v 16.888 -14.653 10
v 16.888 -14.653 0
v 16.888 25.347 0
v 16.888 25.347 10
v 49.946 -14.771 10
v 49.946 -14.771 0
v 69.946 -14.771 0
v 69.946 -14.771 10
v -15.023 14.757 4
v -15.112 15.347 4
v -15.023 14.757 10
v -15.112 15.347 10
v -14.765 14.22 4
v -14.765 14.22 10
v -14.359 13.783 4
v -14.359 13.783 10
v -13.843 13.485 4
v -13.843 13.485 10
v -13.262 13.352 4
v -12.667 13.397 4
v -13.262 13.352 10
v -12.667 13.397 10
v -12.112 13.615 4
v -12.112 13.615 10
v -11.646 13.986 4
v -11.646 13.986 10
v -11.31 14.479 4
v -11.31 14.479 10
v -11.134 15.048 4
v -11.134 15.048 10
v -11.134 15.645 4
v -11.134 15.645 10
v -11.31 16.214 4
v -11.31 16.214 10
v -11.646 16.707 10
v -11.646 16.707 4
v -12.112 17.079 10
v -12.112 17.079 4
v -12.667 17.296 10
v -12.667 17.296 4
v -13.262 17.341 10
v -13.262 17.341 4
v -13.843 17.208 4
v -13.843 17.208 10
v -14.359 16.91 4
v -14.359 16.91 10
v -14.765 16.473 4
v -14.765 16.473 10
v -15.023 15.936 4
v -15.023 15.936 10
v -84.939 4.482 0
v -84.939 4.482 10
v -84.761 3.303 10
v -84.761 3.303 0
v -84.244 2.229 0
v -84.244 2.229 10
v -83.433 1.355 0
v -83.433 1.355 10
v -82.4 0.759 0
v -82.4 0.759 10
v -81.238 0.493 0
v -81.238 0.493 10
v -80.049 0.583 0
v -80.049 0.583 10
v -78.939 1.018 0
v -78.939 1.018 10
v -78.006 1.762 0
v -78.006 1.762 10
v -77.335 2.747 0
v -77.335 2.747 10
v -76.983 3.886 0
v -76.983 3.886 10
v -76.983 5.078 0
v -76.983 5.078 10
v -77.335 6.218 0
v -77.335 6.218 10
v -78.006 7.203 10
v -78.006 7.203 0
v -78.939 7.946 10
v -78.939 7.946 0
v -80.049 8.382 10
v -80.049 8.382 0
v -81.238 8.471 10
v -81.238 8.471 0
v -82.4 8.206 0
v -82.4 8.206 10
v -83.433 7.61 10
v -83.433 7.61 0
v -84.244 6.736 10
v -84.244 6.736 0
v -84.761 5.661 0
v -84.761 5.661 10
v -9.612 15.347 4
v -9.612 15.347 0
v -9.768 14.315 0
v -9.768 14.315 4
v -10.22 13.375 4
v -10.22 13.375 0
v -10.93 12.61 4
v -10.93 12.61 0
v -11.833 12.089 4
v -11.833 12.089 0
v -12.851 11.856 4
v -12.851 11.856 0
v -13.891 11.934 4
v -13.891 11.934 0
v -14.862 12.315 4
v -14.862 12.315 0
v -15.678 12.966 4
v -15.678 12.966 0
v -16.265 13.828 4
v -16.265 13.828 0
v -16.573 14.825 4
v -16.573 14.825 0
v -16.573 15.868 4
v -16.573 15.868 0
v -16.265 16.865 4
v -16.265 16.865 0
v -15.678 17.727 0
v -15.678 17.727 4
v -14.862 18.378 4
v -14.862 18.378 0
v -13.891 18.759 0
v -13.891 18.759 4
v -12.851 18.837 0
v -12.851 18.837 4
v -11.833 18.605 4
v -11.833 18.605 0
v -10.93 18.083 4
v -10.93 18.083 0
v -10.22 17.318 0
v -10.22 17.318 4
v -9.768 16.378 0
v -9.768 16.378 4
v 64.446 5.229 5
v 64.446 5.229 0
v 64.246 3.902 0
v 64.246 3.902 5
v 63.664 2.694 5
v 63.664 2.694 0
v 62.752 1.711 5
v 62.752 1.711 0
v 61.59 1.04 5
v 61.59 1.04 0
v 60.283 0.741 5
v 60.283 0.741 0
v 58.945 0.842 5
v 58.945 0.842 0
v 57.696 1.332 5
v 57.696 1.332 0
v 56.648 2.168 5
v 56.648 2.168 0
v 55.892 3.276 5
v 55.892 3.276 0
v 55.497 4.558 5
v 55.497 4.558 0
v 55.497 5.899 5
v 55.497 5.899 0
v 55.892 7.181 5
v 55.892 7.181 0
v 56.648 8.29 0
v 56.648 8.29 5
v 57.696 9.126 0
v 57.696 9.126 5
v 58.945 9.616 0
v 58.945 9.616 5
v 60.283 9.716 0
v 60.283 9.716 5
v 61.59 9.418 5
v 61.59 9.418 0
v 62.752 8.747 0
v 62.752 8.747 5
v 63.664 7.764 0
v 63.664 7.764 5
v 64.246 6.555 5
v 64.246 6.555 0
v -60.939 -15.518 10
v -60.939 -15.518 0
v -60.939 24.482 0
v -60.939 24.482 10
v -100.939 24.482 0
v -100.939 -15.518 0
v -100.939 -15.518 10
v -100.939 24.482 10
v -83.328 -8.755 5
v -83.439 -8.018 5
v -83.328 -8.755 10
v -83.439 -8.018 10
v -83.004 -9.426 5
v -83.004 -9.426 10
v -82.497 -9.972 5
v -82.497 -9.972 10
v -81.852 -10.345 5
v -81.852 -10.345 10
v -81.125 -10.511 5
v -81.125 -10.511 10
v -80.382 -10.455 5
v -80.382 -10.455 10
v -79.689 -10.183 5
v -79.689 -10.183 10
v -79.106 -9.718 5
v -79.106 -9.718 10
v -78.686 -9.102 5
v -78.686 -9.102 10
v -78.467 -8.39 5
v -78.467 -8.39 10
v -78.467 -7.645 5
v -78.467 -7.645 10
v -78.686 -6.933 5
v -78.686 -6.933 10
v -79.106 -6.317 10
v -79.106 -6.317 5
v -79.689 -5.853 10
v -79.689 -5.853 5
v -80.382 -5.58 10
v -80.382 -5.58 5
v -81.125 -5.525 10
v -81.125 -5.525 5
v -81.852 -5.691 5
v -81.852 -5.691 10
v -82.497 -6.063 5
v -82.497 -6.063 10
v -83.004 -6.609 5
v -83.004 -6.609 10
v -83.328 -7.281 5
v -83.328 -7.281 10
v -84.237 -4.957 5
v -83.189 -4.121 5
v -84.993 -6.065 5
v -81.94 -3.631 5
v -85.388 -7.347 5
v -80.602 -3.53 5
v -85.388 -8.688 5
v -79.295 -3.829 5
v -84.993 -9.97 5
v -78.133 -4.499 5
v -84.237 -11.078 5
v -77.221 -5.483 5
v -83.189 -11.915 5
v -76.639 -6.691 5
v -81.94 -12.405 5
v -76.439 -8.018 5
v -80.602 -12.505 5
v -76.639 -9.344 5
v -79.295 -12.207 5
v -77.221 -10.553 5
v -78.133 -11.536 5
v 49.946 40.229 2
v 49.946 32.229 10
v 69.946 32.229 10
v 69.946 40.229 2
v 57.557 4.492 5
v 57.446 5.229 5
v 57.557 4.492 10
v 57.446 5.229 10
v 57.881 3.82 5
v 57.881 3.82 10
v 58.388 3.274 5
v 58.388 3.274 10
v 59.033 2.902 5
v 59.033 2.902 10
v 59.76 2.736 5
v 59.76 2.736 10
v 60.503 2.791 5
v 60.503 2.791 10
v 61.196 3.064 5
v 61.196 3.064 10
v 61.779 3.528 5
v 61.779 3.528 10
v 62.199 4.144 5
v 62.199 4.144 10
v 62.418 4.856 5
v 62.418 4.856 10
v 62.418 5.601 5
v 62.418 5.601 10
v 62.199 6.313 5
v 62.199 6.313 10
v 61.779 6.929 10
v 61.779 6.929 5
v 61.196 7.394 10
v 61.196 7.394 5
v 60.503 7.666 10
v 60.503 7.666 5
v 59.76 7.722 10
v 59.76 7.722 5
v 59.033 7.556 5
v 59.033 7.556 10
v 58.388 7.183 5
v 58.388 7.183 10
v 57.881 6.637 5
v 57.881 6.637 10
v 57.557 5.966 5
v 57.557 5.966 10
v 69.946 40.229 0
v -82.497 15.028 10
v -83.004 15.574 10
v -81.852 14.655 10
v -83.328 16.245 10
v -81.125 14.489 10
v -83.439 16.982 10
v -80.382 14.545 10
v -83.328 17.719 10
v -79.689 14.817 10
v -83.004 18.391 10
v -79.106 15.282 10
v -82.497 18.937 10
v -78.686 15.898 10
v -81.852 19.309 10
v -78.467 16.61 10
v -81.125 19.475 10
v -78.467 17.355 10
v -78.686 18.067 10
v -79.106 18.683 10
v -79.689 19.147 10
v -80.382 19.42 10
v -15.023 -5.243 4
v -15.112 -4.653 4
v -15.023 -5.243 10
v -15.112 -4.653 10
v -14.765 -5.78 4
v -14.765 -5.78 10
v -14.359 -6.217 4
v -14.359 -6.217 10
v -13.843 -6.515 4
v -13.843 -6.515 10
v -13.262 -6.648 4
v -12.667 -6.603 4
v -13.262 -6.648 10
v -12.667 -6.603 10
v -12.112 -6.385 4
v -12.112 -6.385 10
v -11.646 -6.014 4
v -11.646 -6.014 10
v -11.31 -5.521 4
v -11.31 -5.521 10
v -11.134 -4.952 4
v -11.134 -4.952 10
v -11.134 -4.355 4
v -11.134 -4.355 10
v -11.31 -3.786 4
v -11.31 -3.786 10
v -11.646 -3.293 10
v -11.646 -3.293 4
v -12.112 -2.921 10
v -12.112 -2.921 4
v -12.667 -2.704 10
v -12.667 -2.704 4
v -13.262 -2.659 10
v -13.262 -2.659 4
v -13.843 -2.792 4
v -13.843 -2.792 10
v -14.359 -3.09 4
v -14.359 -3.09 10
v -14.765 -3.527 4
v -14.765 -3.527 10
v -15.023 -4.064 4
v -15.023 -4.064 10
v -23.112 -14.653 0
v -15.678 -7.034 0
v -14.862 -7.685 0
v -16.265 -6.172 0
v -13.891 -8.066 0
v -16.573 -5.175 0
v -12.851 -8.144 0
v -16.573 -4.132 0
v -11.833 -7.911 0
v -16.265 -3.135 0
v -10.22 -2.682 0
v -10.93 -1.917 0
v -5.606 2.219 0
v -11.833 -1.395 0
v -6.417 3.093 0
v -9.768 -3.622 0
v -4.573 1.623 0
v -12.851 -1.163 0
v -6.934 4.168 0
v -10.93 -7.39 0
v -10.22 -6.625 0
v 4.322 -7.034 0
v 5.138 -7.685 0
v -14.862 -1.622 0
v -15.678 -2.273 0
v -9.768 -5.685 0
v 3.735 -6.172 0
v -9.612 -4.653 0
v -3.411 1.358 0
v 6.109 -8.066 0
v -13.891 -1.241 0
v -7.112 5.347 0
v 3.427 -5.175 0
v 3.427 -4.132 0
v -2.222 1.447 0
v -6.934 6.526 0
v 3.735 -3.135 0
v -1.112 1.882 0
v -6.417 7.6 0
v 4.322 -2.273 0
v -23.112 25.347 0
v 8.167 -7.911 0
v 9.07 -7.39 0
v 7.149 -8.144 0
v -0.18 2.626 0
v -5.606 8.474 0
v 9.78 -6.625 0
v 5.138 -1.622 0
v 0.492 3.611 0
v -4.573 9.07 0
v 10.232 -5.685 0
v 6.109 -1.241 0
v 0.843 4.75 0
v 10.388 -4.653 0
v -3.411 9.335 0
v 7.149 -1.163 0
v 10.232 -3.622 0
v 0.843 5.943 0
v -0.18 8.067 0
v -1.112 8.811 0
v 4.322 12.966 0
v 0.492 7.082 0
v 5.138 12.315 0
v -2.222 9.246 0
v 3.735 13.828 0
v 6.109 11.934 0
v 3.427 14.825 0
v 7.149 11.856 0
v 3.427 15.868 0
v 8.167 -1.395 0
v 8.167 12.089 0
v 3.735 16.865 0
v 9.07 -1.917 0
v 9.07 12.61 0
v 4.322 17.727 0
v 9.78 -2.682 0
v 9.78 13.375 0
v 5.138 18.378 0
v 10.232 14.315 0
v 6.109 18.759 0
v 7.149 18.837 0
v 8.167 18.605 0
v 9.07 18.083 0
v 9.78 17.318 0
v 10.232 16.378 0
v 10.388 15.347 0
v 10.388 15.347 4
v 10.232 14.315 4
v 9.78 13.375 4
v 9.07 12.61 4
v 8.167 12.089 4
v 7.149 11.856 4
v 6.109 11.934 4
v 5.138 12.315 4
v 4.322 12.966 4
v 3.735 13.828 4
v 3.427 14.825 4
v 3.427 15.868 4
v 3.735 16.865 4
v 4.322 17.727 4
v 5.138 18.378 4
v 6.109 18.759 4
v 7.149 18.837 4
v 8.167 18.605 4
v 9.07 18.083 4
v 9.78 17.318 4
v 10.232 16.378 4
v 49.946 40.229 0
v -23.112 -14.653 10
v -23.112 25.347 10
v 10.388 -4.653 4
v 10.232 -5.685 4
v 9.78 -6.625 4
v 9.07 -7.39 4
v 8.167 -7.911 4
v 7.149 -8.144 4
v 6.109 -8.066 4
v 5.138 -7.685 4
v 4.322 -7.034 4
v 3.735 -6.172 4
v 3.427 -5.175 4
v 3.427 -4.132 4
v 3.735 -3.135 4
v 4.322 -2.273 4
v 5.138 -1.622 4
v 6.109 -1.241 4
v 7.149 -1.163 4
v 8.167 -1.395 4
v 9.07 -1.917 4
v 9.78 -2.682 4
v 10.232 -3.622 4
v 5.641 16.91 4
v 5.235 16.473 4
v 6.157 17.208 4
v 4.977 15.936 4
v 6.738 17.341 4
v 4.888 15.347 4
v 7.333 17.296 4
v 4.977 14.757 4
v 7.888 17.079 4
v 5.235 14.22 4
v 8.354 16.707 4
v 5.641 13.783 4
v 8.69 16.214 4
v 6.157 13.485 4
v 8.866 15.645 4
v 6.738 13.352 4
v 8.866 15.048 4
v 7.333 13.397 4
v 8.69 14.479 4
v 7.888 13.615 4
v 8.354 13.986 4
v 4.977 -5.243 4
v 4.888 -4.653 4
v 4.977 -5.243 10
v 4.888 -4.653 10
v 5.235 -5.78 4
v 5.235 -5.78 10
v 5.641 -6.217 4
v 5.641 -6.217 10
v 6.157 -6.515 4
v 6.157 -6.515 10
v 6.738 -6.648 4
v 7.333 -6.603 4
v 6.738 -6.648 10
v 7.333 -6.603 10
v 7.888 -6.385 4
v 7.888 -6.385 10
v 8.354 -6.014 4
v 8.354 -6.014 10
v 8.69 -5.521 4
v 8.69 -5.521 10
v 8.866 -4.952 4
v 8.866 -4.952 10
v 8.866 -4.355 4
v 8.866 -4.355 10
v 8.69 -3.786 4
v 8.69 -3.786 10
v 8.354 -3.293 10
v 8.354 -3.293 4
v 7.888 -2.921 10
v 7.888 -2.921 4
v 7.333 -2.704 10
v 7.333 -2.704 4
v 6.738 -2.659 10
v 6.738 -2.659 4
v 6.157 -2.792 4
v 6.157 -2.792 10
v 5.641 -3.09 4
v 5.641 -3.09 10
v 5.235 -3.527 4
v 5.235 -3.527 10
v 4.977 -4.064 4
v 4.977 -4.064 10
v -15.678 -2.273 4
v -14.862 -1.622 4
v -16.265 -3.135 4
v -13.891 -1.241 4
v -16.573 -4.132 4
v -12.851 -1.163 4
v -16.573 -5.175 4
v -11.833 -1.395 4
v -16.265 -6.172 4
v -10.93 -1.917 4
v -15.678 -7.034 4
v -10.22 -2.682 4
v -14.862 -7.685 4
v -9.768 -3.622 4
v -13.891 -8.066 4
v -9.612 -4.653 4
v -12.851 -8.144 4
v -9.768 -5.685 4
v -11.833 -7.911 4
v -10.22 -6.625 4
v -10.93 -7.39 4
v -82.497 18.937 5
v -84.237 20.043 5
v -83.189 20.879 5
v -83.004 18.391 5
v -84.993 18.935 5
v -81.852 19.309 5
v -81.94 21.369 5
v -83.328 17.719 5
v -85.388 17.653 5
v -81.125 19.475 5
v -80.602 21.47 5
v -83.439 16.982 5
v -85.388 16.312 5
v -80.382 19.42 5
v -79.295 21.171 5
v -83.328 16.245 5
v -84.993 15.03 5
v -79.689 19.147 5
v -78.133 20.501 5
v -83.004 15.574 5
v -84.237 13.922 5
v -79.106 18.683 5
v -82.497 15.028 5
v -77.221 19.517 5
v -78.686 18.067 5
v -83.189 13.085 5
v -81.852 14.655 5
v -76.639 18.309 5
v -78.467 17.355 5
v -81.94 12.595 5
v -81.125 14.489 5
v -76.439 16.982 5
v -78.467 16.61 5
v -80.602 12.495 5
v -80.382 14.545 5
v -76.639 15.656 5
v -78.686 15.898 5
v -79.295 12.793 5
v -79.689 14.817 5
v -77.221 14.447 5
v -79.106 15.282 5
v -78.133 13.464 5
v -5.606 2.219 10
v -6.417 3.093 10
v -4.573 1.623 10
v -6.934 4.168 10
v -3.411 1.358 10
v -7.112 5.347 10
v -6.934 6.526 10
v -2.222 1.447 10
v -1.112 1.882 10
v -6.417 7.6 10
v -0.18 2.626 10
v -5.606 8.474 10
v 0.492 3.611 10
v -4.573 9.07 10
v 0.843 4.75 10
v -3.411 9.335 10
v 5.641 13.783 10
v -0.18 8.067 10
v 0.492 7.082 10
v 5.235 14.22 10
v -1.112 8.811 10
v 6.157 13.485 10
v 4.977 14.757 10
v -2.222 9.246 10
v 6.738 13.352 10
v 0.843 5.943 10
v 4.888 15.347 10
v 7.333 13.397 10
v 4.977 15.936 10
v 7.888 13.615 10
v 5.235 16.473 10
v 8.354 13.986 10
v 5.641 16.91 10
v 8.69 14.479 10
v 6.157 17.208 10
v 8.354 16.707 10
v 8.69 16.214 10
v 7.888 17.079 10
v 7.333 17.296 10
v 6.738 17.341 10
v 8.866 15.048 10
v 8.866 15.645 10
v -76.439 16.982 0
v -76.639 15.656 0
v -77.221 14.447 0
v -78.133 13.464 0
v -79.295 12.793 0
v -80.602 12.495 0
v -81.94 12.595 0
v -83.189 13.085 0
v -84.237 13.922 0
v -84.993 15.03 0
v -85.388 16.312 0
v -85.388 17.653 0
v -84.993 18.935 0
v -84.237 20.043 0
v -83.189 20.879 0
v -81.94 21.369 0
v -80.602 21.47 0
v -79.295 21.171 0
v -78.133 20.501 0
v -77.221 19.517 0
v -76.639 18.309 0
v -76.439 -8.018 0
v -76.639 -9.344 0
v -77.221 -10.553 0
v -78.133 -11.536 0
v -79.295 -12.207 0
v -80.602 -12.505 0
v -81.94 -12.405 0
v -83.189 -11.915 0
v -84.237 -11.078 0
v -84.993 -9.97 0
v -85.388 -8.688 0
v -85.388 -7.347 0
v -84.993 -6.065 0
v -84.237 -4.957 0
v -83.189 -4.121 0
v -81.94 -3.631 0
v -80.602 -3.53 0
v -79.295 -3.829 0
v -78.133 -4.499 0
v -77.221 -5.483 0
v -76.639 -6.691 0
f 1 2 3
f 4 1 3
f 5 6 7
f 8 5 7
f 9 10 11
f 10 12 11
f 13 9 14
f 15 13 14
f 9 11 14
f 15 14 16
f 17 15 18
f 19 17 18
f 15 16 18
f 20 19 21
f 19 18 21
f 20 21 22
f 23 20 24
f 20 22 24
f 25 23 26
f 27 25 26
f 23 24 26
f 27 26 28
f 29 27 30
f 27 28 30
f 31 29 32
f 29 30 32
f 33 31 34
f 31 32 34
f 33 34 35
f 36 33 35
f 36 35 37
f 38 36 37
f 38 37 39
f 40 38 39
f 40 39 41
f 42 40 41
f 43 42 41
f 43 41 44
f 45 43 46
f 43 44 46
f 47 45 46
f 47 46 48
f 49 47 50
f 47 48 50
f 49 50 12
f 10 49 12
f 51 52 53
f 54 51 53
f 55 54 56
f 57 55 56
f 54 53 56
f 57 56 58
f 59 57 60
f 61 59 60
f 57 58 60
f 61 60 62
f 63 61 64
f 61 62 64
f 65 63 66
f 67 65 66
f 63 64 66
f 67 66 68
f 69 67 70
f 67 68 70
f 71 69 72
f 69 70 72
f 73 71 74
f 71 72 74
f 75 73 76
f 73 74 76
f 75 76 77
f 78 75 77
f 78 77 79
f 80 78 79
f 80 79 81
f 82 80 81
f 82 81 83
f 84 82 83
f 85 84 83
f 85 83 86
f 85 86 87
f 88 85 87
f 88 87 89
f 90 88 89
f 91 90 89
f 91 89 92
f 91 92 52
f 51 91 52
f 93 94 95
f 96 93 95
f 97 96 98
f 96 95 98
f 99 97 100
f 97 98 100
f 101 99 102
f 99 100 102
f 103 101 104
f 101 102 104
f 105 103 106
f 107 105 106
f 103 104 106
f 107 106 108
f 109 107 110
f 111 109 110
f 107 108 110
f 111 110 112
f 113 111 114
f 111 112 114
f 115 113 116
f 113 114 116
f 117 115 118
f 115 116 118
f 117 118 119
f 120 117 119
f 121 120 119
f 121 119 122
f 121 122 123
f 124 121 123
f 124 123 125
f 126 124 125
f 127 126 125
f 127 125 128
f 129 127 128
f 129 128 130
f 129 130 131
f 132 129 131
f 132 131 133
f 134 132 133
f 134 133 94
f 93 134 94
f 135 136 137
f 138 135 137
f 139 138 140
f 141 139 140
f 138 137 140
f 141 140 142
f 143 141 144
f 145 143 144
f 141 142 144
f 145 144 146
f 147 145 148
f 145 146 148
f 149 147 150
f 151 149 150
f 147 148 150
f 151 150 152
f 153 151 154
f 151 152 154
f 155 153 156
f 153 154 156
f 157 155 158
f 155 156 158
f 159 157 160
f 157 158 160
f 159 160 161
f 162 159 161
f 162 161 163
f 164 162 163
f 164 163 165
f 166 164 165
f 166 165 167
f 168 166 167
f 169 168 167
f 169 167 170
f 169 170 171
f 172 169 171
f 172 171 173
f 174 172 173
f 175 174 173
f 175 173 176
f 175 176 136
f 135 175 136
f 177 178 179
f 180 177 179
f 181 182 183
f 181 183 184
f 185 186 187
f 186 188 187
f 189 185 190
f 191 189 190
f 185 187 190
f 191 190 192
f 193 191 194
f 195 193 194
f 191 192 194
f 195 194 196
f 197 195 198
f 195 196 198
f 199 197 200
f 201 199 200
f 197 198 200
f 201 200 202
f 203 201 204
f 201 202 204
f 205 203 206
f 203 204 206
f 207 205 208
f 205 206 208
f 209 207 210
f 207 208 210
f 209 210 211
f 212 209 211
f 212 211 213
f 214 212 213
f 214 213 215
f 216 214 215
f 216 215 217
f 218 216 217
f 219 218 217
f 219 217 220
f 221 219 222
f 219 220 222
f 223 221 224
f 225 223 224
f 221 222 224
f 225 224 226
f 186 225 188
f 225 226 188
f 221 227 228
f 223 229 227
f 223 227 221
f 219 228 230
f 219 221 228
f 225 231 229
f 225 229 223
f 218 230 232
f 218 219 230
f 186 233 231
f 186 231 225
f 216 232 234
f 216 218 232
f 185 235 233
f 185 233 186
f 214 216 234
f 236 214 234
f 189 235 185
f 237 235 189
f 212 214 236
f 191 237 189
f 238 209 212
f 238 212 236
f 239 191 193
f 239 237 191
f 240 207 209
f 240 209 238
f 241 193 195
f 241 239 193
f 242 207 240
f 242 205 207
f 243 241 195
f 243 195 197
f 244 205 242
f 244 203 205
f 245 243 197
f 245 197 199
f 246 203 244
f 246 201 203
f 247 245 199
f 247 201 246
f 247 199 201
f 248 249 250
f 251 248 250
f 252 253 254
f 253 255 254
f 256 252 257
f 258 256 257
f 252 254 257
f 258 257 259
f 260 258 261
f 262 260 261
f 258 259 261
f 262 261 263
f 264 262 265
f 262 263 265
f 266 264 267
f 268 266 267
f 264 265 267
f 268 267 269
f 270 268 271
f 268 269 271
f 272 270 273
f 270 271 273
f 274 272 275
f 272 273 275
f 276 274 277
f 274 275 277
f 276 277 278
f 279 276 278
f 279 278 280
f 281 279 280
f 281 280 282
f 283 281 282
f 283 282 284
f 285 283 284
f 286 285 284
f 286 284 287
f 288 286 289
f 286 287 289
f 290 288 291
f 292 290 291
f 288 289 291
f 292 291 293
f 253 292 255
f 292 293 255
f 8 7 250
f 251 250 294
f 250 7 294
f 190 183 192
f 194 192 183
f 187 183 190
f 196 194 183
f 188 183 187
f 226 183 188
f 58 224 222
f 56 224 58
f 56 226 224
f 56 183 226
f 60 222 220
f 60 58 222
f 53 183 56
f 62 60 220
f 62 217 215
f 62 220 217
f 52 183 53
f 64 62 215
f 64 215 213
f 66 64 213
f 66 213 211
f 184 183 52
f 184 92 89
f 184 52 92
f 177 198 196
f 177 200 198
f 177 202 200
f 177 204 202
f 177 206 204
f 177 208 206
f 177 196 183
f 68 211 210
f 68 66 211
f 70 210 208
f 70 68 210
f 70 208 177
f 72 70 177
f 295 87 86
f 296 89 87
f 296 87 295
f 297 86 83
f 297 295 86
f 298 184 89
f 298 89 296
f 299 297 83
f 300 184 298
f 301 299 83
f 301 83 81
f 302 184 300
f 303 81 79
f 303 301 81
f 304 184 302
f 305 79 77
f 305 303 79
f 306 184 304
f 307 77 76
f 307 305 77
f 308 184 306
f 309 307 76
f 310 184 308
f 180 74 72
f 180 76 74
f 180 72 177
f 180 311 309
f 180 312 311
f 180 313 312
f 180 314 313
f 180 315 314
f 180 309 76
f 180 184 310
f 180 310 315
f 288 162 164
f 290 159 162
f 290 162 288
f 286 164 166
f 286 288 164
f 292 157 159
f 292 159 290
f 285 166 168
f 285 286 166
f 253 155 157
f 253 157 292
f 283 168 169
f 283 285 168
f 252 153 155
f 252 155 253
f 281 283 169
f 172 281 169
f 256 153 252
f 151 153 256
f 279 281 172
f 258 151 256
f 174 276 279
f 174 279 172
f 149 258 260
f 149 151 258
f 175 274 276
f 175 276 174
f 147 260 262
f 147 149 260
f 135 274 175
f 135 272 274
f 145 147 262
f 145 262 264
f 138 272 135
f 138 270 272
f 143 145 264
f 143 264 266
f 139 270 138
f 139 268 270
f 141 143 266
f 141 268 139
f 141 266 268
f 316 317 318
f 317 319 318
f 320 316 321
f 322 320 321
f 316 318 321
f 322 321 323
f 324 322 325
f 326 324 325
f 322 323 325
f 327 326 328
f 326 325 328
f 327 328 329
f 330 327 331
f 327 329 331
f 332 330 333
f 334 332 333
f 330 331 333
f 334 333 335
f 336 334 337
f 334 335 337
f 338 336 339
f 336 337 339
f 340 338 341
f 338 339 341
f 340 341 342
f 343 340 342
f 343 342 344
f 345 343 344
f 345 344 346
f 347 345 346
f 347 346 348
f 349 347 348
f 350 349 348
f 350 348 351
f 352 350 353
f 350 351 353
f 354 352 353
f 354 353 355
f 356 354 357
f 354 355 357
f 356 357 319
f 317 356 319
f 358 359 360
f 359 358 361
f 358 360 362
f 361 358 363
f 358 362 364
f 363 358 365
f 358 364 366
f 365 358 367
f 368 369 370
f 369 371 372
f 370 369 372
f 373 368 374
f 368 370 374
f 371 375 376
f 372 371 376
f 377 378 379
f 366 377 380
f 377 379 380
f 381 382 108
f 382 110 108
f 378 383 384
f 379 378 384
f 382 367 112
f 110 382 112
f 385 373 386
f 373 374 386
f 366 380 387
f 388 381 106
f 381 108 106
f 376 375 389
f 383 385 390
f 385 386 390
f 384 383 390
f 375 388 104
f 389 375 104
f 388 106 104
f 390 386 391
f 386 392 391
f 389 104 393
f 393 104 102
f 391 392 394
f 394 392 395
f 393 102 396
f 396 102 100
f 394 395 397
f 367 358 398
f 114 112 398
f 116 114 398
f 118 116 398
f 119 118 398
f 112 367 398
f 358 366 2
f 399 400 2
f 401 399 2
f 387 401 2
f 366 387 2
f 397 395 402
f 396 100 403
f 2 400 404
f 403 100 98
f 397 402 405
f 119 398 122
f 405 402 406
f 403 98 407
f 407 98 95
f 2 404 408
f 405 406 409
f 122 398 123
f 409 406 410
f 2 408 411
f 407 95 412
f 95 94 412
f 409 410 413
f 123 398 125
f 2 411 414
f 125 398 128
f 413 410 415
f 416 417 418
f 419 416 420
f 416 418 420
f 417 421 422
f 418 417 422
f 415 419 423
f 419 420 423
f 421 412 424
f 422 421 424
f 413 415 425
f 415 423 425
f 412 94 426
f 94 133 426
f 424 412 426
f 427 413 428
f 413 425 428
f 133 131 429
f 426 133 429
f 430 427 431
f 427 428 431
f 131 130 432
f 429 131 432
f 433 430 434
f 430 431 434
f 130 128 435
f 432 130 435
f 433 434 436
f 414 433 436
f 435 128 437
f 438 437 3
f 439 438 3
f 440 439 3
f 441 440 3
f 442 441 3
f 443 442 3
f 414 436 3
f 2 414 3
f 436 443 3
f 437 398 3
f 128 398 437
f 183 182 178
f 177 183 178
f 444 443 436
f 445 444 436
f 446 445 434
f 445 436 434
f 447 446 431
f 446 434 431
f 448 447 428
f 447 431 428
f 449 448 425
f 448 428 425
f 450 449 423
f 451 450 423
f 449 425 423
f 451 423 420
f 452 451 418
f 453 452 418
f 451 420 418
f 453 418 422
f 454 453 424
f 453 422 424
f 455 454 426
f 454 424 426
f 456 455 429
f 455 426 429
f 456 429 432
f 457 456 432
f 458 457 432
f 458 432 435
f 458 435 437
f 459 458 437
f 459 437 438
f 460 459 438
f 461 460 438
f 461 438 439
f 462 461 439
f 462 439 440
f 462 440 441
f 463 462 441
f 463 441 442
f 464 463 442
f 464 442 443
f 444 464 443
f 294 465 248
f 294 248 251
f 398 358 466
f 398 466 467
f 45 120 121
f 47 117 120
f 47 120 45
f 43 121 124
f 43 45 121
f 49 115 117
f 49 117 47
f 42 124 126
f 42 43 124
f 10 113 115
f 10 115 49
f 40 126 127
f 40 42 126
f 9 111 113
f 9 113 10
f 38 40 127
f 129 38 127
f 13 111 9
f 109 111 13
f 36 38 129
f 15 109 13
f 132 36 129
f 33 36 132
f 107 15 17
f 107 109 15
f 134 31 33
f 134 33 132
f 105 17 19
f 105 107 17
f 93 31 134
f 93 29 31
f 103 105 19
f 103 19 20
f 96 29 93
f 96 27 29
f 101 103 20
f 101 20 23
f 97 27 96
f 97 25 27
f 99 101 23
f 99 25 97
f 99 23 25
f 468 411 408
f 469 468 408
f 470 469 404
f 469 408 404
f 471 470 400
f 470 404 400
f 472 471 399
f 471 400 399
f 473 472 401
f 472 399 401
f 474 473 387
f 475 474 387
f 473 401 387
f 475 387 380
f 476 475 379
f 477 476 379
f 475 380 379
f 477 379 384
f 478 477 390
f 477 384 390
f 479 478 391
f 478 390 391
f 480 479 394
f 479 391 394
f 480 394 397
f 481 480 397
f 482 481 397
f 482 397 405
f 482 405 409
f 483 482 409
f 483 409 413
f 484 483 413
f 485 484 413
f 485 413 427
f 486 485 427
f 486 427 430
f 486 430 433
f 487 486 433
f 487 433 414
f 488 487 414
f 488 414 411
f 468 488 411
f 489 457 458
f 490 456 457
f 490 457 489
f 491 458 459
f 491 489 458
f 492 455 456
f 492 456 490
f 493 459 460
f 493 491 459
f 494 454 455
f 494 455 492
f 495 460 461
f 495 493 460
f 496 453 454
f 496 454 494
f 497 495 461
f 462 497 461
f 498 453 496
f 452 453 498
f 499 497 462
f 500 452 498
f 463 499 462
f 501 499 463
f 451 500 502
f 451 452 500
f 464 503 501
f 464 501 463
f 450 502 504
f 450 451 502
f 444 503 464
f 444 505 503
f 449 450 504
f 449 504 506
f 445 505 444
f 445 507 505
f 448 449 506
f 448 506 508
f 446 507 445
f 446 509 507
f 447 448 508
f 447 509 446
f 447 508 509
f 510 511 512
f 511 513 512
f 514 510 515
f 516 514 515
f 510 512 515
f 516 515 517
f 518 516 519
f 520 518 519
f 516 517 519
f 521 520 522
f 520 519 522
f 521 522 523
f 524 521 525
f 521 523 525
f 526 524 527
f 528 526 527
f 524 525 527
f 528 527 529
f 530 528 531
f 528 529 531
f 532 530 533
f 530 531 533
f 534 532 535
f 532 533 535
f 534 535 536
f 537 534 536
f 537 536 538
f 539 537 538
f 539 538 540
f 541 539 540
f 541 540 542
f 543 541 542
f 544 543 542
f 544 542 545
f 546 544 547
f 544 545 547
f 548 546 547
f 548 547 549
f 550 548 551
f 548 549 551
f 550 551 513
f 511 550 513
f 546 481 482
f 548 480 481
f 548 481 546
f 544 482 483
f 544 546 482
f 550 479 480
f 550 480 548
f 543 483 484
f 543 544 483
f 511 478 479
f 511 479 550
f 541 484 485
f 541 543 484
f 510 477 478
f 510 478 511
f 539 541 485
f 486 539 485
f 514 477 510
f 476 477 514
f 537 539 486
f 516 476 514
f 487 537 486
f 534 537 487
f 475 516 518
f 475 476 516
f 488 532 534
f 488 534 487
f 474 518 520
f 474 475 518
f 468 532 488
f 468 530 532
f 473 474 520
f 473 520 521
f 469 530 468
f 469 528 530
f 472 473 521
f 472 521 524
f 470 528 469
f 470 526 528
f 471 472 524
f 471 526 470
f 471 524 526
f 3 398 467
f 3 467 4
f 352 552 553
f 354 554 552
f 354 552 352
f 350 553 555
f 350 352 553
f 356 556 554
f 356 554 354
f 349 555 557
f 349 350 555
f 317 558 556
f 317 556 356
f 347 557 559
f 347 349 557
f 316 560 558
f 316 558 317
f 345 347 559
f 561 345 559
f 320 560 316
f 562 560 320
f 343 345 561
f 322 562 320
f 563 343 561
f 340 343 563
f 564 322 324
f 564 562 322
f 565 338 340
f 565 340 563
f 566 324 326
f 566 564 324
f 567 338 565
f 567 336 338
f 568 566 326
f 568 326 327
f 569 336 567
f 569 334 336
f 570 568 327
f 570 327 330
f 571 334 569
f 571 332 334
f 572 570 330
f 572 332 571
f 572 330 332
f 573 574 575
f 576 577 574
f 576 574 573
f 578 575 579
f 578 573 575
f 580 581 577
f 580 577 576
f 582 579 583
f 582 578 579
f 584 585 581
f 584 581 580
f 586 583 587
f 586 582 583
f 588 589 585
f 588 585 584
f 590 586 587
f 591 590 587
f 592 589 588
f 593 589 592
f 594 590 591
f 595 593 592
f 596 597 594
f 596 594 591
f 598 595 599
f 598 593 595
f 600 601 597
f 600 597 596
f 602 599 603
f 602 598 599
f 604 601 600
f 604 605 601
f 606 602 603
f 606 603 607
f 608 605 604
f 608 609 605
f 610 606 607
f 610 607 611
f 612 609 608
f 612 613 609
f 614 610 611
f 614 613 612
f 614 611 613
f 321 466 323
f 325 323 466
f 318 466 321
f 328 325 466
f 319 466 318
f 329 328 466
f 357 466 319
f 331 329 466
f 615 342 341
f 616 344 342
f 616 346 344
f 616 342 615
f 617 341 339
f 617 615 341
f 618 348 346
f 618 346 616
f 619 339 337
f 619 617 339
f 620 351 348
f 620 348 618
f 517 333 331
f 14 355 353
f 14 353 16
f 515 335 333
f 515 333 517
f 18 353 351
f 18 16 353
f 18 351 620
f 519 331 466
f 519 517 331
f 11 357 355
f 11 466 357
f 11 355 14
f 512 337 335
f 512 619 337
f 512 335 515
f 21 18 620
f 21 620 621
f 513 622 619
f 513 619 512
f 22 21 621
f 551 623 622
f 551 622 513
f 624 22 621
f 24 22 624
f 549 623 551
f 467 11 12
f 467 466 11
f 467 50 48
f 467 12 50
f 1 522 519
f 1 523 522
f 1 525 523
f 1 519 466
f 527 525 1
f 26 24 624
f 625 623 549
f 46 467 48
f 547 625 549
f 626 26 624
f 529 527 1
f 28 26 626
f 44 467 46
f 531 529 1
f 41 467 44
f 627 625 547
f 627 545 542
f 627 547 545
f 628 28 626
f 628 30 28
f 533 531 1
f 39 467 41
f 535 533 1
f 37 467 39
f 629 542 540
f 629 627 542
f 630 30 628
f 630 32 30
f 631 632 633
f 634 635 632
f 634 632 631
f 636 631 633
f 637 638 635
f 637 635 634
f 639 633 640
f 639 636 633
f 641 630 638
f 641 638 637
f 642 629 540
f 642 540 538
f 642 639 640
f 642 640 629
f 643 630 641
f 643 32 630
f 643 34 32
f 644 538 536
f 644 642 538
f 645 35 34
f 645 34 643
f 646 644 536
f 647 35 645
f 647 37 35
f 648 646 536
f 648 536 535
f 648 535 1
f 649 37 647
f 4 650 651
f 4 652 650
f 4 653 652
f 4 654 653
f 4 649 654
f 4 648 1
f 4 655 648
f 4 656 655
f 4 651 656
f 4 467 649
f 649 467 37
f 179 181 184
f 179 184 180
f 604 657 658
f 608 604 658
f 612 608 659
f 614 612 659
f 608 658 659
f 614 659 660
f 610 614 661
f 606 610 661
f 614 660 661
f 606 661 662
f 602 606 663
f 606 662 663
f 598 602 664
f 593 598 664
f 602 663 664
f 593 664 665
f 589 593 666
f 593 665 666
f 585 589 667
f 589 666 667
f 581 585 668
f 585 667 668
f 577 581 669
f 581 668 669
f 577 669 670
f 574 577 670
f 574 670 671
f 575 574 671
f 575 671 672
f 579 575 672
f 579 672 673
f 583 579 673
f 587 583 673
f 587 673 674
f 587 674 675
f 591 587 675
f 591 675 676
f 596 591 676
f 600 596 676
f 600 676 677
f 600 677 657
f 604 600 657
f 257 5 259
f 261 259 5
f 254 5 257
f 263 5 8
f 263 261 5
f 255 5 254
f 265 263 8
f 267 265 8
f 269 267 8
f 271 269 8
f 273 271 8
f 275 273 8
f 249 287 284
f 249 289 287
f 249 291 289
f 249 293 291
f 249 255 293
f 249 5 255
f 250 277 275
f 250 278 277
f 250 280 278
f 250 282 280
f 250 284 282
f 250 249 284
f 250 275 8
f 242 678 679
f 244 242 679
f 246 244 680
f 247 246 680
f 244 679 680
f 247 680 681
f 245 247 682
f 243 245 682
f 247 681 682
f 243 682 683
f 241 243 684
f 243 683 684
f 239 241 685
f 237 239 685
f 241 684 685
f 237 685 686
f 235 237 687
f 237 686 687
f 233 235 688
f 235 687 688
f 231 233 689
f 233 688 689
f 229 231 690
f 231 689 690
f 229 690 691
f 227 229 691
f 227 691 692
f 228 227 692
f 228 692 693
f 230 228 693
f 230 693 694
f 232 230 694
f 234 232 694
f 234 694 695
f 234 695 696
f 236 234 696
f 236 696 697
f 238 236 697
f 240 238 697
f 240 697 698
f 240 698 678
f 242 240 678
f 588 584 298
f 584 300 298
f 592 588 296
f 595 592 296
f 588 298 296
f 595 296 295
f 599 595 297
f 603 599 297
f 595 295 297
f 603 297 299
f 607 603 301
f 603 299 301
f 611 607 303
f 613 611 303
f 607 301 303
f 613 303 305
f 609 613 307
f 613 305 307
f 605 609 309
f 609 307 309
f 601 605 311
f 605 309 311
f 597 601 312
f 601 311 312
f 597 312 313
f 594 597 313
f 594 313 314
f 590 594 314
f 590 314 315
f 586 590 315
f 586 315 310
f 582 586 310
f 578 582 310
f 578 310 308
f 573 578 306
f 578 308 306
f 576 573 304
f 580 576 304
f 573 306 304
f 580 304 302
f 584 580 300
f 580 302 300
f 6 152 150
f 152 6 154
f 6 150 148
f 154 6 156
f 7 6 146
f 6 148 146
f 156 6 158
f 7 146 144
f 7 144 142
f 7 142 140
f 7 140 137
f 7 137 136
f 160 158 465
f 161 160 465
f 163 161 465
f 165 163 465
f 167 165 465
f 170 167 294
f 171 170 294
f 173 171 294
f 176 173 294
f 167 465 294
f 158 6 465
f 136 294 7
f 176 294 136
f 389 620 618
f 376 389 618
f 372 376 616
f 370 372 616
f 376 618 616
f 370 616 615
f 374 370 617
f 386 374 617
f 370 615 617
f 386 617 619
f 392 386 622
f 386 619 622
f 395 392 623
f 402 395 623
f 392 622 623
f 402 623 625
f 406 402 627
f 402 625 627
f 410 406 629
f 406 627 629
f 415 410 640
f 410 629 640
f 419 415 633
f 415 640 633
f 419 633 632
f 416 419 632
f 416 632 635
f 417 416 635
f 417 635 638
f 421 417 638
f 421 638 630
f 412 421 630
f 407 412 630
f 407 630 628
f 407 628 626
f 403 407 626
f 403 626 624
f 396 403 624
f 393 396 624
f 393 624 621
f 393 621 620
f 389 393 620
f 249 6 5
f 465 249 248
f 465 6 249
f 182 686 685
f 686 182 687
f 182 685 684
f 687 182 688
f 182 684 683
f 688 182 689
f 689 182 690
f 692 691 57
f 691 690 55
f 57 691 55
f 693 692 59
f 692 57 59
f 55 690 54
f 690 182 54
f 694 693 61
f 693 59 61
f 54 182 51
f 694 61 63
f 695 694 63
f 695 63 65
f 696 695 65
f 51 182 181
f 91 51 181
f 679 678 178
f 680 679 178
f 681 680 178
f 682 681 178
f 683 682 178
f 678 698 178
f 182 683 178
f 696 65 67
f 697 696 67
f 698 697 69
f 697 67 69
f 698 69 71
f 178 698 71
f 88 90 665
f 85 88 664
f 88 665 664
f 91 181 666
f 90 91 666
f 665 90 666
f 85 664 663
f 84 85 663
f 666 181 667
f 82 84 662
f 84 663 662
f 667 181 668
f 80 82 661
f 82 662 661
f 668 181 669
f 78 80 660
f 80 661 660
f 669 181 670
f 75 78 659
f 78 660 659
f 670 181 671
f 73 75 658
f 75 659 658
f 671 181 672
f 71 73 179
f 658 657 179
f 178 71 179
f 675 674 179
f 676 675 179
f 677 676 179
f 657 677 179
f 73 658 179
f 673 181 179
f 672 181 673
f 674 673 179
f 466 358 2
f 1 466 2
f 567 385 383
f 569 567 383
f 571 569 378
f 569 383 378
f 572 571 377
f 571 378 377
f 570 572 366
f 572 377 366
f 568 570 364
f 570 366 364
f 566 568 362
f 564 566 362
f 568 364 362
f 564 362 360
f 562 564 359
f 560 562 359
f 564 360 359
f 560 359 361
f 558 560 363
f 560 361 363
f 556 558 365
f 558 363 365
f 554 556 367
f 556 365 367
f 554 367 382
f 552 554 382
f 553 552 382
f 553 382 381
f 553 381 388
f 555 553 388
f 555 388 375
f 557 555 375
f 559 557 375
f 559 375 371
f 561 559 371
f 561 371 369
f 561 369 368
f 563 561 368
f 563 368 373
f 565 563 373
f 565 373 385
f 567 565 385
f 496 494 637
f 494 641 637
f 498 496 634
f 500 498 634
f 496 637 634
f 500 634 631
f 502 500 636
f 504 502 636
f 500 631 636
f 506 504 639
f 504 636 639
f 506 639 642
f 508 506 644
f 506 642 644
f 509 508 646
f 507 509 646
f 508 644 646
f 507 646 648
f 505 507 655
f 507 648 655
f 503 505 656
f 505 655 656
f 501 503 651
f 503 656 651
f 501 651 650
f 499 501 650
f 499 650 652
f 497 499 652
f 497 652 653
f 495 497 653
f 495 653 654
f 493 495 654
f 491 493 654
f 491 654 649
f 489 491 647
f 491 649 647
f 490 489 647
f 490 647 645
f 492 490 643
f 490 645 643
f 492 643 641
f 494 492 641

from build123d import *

# Parameters (mm, degrees)
F0_W             = 40
F0_H             = 40
F1_DEPTH         = 10
F0_W_2           = 20
F0_H_2           = 55
F2_D             = 8
F2_2_D           = 8
F3_D             = 4
F3_CBORE_D       = 7
F3_CBORE_DEPTH   = 4
F4_D             = 5
F4_CBORE_D       = 9
F4_CBORE_DEPTH   = 5
F4_2_D           = 5
F4_2_CBORE_D     = 9
F4_2_CBORE_DEPTH = 5
F5_SIZE          = 8


with BuildPart() as f1:
    # F0 (on Top) → F1 (new body)
    with BuildSketch(Plane.XY):
        with Locations((-80.9385883808, 4.4822967425)):
            Rectangle(F0_W, F0_H)
    extrude(amount=F1_DEPTH)

    # F2 (through all)
    with Locations(Plane(origin=(0, 0, 0), x_dir=(1, 0, 0), z_dir=(0, 0, -1))):
        with Locations((-3.1120874919, -5.346580064), (-80.9385883808, -4.4822967425)):
            Hole(F2_D / 2)

    # F4 (through all)
    with Locations(Plane(origin=(0, 0, 0), x_dir=(1, 0, 0), z_dir=(0, 0, -1))):
        with Locations((59.9464087188, -5.2287517861), (-80.9385883808, -16.9822967425), (-80.9385883808, 8.0177032575)):
            CounterBoreHole(F4_D / 2, F4_CBORE_D / 2, F4_CBORE_DEPTH)


with BuildPart() as f1b:
    # F0 (on Top) → F1, piece 2 (new body)
    with BuildSketch(Plane.XY):
        with Locations((-3.1120874919, 5.346580064)):
            Rectangle(F0_W, F0_H)
    extrude(amount=F1_DEPTH)

    # F2#2 (through all)
    with Locations(Plane(origin=(0, 0, 0), x_dir=(1, 0, 0), z_dir=(0, 0, -1))):
        with Locations((-3.1120874919, -5.346580064), (-80.9385883808, -4.4822967425)):
            Hole(F2_2_D / 2)

    # F3 (through all)
    with Locations(Plane(origin=(0, 0, 0), x_dir=(1, 0, 0), z_dir=(0, 0, -1))):
        with Locations((6.8879125081, -15.346580064), (-13.1120874919, -15.346580064), (-13.1120874919, 4.653419936), (6.8879125081, 4.653419936)):
            CounterBoreHole(F3_D / 2, F3_CBORE_D / 2, F3_CBORE_DEPTH)


with BuildPart() as f1c:
    # F0 (on Top) → F1, piece 3 (new body)
    with BuildSketch(Plane.XY):
        with Locations((59.9464087188, 12.7287517861)):
            Rectangle(F0_W_2, F0_H_2)
    extrude(amount=F1_DEPTH)

    # F4#2 (through all)
    with Locations(Plane(origin=(0, 0, 0), x_dir=(1, 0, 0), z_dir=(0, 0, -1))):
        with Locations((59.9464087188, -5.2287517861), (-80.9385883808, -16.9822967425), (-80.9385883808, 8.0177032575)):
            CounterBoreHole(F4_2_D / 2, F4_2_CBORE_D / 2, F4_2_CBORE_DEPTH)

    # F5
    f5_edges = [f1c.edges().sort_by_distance(p)[0] for p in [
        (59.946409, 40.228752, 10),
    ]]
    chamfer(f5_edges, length=F5_SIZE)


solid = Compound([f1.part, f1b.part, f1c.part])
